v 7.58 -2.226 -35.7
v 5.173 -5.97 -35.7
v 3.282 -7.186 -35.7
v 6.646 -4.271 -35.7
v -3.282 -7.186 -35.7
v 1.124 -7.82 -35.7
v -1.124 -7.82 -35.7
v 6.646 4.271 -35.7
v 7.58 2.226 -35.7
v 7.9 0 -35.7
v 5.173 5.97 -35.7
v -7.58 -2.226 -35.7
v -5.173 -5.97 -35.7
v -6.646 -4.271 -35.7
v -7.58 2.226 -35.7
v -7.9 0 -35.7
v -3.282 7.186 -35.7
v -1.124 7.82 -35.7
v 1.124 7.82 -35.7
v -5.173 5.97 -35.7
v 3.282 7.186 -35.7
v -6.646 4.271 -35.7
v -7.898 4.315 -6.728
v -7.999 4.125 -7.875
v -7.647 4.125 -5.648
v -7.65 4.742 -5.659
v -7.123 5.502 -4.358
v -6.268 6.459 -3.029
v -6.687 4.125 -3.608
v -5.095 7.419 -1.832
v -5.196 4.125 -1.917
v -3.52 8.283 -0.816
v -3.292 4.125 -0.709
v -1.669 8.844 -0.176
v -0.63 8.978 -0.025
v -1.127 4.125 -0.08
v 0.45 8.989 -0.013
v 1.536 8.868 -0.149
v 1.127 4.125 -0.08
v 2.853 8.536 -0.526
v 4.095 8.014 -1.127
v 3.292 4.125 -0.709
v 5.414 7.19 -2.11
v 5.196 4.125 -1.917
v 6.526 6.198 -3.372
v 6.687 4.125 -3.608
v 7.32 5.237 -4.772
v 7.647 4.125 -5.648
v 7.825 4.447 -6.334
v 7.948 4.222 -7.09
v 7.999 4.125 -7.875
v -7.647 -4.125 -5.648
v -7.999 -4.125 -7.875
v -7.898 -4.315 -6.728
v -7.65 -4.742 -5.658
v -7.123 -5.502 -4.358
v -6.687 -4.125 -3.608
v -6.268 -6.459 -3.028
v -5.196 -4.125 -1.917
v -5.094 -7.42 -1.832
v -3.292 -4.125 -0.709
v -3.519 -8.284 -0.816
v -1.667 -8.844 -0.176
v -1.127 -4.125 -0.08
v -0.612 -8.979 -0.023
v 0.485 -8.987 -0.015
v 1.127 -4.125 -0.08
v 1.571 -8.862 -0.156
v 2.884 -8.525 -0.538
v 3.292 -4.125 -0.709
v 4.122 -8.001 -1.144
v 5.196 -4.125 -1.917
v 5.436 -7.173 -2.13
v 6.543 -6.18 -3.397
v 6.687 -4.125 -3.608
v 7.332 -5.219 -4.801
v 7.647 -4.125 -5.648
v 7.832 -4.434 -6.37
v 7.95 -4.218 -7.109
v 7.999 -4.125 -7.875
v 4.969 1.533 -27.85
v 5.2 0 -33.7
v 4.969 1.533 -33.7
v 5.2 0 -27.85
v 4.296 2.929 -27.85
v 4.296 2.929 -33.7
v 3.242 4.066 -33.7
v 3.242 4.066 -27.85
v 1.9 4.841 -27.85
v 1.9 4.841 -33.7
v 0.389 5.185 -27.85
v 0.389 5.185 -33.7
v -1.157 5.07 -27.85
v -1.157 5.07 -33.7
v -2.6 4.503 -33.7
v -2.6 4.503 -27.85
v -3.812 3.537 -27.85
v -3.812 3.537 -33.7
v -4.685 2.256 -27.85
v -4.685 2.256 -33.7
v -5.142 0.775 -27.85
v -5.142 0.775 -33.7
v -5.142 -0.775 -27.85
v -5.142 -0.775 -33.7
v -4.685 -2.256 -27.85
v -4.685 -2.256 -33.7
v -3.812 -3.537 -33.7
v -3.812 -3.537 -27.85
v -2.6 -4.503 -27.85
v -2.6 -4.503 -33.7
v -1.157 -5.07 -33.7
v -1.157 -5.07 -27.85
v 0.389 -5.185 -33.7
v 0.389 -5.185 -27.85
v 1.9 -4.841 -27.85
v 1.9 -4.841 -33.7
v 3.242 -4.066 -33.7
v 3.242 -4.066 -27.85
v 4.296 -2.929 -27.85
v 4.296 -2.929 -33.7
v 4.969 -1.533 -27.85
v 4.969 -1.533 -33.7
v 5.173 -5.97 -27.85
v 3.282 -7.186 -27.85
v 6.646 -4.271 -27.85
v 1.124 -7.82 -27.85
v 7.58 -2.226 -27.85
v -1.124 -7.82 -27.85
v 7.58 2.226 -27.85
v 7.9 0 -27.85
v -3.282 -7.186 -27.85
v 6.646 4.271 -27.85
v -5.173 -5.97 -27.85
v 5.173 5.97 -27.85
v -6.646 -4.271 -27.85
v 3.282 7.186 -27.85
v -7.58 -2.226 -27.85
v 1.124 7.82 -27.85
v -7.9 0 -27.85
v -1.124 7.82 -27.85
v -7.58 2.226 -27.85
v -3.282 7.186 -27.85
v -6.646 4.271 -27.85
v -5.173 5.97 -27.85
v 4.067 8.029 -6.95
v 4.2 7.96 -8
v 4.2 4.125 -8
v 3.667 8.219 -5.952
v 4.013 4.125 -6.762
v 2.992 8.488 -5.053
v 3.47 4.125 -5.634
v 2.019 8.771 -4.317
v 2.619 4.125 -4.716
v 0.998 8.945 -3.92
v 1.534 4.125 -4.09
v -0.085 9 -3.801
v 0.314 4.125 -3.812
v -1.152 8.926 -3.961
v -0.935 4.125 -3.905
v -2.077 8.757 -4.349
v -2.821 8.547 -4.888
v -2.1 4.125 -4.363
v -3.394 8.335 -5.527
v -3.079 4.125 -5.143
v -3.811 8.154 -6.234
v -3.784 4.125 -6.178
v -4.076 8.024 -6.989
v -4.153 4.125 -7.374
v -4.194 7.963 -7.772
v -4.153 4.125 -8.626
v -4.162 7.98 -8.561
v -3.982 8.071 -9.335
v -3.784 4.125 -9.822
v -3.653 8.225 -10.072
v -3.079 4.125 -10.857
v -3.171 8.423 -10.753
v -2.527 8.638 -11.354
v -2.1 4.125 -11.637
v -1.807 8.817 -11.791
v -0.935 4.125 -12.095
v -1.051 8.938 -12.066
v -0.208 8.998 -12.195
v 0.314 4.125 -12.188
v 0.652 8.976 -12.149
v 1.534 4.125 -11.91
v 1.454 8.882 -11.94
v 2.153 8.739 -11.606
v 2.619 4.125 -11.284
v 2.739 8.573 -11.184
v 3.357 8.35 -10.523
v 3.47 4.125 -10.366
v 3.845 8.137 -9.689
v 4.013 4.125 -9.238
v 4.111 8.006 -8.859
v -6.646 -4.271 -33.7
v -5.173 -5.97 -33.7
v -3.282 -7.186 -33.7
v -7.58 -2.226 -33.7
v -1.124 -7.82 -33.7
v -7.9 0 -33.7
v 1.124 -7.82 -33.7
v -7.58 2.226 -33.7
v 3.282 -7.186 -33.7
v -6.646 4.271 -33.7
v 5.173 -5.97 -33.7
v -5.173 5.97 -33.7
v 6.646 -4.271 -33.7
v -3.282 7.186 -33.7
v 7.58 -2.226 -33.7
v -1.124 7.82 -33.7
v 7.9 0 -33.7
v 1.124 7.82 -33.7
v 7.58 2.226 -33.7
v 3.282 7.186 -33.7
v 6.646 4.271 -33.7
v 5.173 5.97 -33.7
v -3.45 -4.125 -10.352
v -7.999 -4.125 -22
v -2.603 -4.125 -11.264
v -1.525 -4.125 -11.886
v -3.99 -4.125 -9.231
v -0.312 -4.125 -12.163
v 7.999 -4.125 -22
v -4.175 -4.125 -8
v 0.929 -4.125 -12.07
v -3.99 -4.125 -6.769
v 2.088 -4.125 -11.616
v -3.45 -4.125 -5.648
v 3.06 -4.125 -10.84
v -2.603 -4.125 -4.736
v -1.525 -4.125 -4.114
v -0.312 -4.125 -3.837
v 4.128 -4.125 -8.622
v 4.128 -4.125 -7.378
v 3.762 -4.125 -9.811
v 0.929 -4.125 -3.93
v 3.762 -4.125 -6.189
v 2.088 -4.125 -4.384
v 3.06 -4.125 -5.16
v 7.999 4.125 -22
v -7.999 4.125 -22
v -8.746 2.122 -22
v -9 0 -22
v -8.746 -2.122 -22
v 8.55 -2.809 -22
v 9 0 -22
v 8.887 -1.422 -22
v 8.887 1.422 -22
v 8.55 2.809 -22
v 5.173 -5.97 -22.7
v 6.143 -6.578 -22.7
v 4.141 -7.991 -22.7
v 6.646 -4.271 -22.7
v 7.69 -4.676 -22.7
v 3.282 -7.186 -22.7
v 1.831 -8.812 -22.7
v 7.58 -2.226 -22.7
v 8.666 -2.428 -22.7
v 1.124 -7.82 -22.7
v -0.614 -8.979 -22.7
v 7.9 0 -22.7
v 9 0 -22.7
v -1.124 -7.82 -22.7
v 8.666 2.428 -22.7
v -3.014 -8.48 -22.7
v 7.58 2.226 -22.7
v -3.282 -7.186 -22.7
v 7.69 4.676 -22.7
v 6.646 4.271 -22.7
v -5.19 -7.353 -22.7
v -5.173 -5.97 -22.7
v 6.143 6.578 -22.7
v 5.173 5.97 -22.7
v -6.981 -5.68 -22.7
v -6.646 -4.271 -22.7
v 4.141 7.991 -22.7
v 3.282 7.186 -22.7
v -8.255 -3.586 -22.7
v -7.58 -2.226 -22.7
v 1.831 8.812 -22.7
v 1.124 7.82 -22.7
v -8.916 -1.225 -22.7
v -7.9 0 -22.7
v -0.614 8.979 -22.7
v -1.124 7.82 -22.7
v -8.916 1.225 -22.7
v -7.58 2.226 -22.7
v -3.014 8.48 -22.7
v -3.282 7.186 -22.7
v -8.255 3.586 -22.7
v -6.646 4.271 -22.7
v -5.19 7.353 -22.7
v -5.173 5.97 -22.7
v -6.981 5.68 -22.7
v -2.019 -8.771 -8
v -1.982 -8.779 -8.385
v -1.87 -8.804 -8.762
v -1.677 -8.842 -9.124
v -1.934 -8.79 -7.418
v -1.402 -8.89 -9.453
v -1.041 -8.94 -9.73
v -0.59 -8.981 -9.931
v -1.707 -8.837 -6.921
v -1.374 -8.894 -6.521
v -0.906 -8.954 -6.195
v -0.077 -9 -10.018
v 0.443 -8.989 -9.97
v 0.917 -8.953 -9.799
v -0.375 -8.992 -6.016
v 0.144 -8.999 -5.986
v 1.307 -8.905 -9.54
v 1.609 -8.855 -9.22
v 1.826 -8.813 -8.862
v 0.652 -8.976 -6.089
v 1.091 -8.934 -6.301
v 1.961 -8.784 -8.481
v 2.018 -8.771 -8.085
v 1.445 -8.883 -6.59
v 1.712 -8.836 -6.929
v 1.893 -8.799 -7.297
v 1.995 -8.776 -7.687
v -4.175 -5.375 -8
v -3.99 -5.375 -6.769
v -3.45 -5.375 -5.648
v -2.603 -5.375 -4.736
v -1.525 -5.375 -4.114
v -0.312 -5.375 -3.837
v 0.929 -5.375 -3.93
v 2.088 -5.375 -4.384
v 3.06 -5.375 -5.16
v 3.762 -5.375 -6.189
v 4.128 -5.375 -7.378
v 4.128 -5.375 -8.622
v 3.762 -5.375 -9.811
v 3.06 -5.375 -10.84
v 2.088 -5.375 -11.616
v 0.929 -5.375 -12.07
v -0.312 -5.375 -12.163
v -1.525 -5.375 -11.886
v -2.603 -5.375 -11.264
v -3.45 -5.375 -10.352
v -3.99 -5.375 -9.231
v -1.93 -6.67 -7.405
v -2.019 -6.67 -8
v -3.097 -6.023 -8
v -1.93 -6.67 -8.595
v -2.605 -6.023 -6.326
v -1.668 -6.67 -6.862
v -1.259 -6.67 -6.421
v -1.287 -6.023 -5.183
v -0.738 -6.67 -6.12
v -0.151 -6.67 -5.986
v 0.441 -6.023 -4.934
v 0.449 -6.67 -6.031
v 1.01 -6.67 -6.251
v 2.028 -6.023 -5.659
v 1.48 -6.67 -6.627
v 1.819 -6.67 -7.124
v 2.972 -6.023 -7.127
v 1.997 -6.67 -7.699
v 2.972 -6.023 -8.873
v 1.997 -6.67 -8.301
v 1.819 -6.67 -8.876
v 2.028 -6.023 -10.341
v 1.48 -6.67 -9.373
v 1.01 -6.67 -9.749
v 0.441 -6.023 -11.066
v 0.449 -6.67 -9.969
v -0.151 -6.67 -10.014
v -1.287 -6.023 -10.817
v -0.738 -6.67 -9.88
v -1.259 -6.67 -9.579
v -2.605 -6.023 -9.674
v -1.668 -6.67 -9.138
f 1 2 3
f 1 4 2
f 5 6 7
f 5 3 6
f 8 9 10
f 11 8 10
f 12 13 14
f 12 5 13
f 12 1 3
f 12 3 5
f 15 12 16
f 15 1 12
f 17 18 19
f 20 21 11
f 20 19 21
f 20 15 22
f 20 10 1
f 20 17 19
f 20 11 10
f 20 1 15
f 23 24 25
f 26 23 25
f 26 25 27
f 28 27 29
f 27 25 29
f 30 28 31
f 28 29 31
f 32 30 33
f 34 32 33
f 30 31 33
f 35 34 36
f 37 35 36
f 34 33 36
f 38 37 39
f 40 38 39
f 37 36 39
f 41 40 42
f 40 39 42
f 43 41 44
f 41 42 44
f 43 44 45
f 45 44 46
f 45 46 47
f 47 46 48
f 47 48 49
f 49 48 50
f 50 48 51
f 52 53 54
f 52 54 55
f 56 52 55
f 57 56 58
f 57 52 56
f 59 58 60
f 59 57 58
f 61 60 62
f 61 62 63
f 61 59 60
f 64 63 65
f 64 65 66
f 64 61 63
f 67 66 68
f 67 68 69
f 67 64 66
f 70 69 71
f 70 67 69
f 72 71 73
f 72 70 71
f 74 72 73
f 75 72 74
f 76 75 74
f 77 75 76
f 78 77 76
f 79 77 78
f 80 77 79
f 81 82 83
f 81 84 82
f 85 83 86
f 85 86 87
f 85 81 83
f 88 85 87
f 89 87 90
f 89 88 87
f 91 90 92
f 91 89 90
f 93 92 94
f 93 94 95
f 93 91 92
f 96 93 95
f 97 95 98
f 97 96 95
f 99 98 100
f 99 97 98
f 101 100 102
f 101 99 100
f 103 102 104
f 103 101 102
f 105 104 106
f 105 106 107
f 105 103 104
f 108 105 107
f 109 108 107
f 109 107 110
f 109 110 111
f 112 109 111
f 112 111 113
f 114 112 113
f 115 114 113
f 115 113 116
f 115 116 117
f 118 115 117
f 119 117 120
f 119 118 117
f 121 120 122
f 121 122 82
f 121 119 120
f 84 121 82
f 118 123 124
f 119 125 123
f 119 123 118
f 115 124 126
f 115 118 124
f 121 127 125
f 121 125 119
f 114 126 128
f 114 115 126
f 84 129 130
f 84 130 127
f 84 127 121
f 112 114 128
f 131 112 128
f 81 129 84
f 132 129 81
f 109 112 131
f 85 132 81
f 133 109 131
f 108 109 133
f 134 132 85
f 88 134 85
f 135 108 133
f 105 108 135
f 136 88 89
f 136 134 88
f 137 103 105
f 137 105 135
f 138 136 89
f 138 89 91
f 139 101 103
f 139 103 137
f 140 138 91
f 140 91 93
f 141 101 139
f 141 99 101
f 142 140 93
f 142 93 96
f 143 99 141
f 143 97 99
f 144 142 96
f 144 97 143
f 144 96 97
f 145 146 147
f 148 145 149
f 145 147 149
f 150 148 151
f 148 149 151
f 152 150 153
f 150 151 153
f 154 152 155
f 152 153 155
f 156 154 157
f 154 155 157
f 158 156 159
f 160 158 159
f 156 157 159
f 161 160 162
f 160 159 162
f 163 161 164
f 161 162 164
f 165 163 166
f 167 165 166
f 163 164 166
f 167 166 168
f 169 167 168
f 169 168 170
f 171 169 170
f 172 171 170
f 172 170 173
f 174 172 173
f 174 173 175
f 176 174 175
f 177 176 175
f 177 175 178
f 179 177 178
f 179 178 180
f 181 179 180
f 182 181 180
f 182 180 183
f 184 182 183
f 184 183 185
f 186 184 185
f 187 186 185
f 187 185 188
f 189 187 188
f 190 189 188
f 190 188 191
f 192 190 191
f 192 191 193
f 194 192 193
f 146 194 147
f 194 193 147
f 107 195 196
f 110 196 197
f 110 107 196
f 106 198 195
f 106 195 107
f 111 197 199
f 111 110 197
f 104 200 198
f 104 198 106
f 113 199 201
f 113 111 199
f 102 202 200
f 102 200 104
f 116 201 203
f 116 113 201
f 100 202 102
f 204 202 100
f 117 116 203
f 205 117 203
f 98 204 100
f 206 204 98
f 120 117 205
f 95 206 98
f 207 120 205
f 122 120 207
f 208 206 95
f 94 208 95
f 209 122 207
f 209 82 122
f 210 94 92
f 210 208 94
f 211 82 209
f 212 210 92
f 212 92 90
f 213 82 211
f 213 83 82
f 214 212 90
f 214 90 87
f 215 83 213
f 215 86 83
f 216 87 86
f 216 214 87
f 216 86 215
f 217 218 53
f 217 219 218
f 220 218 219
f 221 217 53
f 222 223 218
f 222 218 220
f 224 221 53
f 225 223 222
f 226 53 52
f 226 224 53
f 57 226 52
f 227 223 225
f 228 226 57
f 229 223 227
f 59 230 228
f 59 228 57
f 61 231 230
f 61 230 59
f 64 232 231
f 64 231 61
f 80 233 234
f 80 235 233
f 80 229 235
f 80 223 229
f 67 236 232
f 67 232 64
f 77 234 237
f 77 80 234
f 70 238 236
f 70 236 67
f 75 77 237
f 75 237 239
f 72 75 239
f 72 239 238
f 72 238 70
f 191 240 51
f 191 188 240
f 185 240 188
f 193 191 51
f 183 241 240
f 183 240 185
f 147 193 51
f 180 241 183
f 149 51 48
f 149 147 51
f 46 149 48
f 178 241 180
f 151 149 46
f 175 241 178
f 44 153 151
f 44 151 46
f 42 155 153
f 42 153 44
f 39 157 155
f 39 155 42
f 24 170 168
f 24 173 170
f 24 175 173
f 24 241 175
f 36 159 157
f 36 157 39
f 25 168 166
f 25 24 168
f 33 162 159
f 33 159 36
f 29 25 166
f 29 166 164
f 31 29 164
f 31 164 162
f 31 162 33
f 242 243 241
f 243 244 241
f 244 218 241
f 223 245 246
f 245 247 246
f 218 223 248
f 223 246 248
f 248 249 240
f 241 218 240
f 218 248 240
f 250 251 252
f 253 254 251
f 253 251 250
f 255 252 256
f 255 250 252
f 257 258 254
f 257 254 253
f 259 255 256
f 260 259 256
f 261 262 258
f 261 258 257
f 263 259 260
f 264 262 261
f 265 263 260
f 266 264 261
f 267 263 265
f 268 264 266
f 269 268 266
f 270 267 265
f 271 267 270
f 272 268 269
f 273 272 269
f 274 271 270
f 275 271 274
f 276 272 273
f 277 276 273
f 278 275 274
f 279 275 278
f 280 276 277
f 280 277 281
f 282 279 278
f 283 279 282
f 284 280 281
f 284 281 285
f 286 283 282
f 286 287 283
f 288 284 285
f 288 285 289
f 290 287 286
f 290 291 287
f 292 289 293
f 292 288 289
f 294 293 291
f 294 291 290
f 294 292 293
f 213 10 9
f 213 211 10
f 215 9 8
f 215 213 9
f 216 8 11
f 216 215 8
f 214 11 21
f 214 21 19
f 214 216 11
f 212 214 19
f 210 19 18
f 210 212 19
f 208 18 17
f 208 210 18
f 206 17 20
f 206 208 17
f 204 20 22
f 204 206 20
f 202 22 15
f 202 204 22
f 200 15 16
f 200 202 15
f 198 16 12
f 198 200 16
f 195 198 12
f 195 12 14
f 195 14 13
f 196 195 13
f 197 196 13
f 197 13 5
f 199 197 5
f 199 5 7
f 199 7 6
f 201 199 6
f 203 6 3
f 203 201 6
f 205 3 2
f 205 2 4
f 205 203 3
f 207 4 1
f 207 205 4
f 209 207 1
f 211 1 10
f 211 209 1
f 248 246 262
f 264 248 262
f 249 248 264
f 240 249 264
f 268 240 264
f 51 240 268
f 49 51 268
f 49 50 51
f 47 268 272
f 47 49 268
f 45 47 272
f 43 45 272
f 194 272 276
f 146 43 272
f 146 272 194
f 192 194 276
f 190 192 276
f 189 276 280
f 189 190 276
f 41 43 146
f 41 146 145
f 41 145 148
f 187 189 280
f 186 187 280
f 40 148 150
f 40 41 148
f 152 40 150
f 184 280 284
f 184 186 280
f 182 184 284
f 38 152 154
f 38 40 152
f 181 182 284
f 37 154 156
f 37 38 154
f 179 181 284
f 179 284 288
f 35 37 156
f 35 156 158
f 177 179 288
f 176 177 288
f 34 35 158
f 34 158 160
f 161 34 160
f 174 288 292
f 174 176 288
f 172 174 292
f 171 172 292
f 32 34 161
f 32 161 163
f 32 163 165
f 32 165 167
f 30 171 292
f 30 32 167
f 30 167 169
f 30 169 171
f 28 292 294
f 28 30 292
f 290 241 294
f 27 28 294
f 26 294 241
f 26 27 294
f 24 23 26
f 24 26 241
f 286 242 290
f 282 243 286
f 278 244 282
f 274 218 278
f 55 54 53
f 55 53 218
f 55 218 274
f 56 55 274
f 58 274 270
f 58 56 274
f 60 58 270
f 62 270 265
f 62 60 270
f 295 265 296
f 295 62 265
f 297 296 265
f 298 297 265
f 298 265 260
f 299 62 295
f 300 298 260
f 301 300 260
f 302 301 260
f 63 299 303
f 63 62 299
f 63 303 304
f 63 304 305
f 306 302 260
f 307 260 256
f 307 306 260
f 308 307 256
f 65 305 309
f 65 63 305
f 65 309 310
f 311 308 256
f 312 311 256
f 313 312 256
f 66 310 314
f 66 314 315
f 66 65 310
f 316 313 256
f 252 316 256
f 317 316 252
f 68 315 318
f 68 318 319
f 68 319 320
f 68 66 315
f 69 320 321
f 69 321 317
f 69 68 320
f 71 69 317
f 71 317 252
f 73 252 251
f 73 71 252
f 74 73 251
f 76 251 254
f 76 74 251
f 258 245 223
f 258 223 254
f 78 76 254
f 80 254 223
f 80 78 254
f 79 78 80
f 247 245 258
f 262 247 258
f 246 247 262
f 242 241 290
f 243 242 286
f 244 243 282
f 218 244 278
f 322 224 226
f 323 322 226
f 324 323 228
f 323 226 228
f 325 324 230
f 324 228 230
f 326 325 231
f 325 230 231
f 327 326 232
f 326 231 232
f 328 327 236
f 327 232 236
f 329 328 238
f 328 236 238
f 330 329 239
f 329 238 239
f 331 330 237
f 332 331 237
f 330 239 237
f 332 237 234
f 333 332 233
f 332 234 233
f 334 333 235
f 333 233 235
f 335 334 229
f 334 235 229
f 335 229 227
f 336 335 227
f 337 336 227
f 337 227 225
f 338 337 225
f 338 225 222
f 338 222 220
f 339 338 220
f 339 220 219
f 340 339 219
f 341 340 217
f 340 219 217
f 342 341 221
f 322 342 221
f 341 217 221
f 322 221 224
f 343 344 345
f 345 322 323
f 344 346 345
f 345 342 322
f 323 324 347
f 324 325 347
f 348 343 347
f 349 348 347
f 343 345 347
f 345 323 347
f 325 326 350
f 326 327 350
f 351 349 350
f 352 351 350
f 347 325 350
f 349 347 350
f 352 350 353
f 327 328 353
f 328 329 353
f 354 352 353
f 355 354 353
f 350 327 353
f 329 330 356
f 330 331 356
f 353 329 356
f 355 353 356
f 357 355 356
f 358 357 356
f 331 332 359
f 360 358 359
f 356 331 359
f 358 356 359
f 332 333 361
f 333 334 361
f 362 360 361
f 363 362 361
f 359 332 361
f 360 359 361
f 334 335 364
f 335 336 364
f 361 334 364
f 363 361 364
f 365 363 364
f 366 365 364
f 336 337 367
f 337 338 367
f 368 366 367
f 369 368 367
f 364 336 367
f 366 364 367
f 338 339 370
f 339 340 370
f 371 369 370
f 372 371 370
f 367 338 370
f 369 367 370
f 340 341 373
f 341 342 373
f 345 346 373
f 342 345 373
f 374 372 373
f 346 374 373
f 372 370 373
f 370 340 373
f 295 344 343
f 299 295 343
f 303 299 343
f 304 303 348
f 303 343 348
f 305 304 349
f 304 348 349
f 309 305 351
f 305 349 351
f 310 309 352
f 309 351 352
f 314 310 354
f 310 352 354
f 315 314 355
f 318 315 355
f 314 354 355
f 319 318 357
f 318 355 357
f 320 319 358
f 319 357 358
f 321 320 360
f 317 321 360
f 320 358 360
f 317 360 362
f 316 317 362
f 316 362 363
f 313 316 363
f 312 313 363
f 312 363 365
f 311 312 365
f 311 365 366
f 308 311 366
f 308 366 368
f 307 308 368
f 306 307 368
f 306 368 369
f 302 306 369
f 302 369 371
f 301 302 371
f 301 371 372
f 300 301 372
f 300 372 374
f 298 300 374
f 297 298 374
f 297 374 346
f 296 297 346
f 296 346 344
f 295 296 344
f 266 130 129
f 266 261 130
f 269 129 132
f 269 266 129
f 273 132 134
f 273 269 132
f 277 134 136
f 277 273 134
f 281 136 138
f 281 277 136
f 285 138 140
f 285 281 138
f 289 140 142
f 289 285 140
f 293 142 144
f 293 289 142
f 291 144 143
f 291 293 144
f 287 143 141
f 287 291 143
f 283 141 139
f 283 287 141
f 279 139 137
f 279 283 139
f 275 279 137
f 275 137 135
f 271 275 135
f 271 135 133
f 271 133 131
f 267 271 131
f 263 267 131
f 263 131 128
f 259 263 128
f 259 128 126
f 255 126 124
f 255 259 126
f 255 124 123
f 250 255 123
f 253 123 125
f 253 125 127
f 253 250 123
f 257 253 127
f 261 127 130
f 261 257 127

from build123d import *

# Parameters (mm, degrees)
F2_W           = 8.25
F2_H           = 22
F3_DEPTH       = 9.001
F3_DEPTH_BACK  = 9.001
F5_D           = 4.0386
F5_DEPTH       = 4.876
F6_D           = 8.35
F6_DEPTH       = 1.25
F6_TIP         = 2.5085930844
F8_D           = 8.4
F8_DEPTH       = 4.8760001
F10_DEPTH      = 9.0010001
F10_DEPTH_BACK = 9.0010001007


with BuildPart() as f1:
    # F0 (on Front) → F1 (revolve)
    with BuildSketch(Plane.XZ):
        Polygon((9, 0), (0, 0), (0, -35.7), (7.9, -35.7), (7.9, -33.7), (5.2, -33.7), (5.2, -27.85), (7.9, -27.85), (7.9, -22.7), (9, -22.7), align=None)
    revolve(axis=Axis((0, 0, -17.85), (0, 0, 1)))

    # F2 (on Right) → F3 (cut, two sides)
    with BuildSketch(Plane.YZ) as f3_sk:
        with Locations((0, -11)):
            Rectangle(F2_W, F2_H)
    extrude(amount=-F3_DEPTH, mode=Mode.SUBTRACT)
    extrude(f3_sk.sketch, amount=F3_DEPTH_BACK, mode=Mode.SUBTRACT)

    # F5 (through all, one way)
    with BuildSketch(Plane(origin=(0, -4.125, 0), x_dir=(-1, 0, 0), z_dir=(0, 1, 0))):
        with Locations((0, -8)):
            Circle(F5_D / 2)
    extrude(amount=-F5_DEPTH, mode=Mode.SUBTRACT)

    # F6 (one way)
    with BuildSketch(Plane(origin=(0, -4.125, 0), x_dir=(-1, 0, 0), z_dir=(0, 1, 0))):
        with Locations((0, -8)):
            Circle(F6_D / 2)
    extrude(amount=-F6_DEPTH, mode=Mode.SUBTRACT)
    with Locations(Plane(origin=(0, -4.125, 0), x_dir=(-1, 0, 0), z_dir=(0, 1, 0))):
        with Locations((0, -8)):
            with Locations((0, 0, -(F6_DEPTH + F6_TIP / 2))):  # 118° drill point
                Cone(0, F6_D / 2, F6_TIP, mode=Mode.SUBTRACT)

    # F8 (through all, one way)
    with BuildSketch(Plane.XZ.offset(-4.125)):
        with Locations((0, -8)):
            Circle(F8_D / 2)
    extrude(amount=-F8_DEPTH, mode=Mode.SUBTRACT)

    # F9 (on Front) → F10 (cut, two sides)
    with BuildSketch(Plane.XZ) as f10_sk:
        with BuildLine():
            ThreePointArc((-8, -8), (0, 0), (8, -8))
            Line((8, -8), (8, 2.4616862277))
            Line((8, 2.4616862277), (-8, 2.4616862277))
            Line((-8, 2.4616862277), (-8, -8))
        make_face()
    extrude(amount=-F10_DEPTH, mode=Mode.SUBTRACT)
    extrude(f10_sk.sketch, amount=F10_DEPTH_BACK, mode=Mode.SUBTRACT)


solid = f1.part
